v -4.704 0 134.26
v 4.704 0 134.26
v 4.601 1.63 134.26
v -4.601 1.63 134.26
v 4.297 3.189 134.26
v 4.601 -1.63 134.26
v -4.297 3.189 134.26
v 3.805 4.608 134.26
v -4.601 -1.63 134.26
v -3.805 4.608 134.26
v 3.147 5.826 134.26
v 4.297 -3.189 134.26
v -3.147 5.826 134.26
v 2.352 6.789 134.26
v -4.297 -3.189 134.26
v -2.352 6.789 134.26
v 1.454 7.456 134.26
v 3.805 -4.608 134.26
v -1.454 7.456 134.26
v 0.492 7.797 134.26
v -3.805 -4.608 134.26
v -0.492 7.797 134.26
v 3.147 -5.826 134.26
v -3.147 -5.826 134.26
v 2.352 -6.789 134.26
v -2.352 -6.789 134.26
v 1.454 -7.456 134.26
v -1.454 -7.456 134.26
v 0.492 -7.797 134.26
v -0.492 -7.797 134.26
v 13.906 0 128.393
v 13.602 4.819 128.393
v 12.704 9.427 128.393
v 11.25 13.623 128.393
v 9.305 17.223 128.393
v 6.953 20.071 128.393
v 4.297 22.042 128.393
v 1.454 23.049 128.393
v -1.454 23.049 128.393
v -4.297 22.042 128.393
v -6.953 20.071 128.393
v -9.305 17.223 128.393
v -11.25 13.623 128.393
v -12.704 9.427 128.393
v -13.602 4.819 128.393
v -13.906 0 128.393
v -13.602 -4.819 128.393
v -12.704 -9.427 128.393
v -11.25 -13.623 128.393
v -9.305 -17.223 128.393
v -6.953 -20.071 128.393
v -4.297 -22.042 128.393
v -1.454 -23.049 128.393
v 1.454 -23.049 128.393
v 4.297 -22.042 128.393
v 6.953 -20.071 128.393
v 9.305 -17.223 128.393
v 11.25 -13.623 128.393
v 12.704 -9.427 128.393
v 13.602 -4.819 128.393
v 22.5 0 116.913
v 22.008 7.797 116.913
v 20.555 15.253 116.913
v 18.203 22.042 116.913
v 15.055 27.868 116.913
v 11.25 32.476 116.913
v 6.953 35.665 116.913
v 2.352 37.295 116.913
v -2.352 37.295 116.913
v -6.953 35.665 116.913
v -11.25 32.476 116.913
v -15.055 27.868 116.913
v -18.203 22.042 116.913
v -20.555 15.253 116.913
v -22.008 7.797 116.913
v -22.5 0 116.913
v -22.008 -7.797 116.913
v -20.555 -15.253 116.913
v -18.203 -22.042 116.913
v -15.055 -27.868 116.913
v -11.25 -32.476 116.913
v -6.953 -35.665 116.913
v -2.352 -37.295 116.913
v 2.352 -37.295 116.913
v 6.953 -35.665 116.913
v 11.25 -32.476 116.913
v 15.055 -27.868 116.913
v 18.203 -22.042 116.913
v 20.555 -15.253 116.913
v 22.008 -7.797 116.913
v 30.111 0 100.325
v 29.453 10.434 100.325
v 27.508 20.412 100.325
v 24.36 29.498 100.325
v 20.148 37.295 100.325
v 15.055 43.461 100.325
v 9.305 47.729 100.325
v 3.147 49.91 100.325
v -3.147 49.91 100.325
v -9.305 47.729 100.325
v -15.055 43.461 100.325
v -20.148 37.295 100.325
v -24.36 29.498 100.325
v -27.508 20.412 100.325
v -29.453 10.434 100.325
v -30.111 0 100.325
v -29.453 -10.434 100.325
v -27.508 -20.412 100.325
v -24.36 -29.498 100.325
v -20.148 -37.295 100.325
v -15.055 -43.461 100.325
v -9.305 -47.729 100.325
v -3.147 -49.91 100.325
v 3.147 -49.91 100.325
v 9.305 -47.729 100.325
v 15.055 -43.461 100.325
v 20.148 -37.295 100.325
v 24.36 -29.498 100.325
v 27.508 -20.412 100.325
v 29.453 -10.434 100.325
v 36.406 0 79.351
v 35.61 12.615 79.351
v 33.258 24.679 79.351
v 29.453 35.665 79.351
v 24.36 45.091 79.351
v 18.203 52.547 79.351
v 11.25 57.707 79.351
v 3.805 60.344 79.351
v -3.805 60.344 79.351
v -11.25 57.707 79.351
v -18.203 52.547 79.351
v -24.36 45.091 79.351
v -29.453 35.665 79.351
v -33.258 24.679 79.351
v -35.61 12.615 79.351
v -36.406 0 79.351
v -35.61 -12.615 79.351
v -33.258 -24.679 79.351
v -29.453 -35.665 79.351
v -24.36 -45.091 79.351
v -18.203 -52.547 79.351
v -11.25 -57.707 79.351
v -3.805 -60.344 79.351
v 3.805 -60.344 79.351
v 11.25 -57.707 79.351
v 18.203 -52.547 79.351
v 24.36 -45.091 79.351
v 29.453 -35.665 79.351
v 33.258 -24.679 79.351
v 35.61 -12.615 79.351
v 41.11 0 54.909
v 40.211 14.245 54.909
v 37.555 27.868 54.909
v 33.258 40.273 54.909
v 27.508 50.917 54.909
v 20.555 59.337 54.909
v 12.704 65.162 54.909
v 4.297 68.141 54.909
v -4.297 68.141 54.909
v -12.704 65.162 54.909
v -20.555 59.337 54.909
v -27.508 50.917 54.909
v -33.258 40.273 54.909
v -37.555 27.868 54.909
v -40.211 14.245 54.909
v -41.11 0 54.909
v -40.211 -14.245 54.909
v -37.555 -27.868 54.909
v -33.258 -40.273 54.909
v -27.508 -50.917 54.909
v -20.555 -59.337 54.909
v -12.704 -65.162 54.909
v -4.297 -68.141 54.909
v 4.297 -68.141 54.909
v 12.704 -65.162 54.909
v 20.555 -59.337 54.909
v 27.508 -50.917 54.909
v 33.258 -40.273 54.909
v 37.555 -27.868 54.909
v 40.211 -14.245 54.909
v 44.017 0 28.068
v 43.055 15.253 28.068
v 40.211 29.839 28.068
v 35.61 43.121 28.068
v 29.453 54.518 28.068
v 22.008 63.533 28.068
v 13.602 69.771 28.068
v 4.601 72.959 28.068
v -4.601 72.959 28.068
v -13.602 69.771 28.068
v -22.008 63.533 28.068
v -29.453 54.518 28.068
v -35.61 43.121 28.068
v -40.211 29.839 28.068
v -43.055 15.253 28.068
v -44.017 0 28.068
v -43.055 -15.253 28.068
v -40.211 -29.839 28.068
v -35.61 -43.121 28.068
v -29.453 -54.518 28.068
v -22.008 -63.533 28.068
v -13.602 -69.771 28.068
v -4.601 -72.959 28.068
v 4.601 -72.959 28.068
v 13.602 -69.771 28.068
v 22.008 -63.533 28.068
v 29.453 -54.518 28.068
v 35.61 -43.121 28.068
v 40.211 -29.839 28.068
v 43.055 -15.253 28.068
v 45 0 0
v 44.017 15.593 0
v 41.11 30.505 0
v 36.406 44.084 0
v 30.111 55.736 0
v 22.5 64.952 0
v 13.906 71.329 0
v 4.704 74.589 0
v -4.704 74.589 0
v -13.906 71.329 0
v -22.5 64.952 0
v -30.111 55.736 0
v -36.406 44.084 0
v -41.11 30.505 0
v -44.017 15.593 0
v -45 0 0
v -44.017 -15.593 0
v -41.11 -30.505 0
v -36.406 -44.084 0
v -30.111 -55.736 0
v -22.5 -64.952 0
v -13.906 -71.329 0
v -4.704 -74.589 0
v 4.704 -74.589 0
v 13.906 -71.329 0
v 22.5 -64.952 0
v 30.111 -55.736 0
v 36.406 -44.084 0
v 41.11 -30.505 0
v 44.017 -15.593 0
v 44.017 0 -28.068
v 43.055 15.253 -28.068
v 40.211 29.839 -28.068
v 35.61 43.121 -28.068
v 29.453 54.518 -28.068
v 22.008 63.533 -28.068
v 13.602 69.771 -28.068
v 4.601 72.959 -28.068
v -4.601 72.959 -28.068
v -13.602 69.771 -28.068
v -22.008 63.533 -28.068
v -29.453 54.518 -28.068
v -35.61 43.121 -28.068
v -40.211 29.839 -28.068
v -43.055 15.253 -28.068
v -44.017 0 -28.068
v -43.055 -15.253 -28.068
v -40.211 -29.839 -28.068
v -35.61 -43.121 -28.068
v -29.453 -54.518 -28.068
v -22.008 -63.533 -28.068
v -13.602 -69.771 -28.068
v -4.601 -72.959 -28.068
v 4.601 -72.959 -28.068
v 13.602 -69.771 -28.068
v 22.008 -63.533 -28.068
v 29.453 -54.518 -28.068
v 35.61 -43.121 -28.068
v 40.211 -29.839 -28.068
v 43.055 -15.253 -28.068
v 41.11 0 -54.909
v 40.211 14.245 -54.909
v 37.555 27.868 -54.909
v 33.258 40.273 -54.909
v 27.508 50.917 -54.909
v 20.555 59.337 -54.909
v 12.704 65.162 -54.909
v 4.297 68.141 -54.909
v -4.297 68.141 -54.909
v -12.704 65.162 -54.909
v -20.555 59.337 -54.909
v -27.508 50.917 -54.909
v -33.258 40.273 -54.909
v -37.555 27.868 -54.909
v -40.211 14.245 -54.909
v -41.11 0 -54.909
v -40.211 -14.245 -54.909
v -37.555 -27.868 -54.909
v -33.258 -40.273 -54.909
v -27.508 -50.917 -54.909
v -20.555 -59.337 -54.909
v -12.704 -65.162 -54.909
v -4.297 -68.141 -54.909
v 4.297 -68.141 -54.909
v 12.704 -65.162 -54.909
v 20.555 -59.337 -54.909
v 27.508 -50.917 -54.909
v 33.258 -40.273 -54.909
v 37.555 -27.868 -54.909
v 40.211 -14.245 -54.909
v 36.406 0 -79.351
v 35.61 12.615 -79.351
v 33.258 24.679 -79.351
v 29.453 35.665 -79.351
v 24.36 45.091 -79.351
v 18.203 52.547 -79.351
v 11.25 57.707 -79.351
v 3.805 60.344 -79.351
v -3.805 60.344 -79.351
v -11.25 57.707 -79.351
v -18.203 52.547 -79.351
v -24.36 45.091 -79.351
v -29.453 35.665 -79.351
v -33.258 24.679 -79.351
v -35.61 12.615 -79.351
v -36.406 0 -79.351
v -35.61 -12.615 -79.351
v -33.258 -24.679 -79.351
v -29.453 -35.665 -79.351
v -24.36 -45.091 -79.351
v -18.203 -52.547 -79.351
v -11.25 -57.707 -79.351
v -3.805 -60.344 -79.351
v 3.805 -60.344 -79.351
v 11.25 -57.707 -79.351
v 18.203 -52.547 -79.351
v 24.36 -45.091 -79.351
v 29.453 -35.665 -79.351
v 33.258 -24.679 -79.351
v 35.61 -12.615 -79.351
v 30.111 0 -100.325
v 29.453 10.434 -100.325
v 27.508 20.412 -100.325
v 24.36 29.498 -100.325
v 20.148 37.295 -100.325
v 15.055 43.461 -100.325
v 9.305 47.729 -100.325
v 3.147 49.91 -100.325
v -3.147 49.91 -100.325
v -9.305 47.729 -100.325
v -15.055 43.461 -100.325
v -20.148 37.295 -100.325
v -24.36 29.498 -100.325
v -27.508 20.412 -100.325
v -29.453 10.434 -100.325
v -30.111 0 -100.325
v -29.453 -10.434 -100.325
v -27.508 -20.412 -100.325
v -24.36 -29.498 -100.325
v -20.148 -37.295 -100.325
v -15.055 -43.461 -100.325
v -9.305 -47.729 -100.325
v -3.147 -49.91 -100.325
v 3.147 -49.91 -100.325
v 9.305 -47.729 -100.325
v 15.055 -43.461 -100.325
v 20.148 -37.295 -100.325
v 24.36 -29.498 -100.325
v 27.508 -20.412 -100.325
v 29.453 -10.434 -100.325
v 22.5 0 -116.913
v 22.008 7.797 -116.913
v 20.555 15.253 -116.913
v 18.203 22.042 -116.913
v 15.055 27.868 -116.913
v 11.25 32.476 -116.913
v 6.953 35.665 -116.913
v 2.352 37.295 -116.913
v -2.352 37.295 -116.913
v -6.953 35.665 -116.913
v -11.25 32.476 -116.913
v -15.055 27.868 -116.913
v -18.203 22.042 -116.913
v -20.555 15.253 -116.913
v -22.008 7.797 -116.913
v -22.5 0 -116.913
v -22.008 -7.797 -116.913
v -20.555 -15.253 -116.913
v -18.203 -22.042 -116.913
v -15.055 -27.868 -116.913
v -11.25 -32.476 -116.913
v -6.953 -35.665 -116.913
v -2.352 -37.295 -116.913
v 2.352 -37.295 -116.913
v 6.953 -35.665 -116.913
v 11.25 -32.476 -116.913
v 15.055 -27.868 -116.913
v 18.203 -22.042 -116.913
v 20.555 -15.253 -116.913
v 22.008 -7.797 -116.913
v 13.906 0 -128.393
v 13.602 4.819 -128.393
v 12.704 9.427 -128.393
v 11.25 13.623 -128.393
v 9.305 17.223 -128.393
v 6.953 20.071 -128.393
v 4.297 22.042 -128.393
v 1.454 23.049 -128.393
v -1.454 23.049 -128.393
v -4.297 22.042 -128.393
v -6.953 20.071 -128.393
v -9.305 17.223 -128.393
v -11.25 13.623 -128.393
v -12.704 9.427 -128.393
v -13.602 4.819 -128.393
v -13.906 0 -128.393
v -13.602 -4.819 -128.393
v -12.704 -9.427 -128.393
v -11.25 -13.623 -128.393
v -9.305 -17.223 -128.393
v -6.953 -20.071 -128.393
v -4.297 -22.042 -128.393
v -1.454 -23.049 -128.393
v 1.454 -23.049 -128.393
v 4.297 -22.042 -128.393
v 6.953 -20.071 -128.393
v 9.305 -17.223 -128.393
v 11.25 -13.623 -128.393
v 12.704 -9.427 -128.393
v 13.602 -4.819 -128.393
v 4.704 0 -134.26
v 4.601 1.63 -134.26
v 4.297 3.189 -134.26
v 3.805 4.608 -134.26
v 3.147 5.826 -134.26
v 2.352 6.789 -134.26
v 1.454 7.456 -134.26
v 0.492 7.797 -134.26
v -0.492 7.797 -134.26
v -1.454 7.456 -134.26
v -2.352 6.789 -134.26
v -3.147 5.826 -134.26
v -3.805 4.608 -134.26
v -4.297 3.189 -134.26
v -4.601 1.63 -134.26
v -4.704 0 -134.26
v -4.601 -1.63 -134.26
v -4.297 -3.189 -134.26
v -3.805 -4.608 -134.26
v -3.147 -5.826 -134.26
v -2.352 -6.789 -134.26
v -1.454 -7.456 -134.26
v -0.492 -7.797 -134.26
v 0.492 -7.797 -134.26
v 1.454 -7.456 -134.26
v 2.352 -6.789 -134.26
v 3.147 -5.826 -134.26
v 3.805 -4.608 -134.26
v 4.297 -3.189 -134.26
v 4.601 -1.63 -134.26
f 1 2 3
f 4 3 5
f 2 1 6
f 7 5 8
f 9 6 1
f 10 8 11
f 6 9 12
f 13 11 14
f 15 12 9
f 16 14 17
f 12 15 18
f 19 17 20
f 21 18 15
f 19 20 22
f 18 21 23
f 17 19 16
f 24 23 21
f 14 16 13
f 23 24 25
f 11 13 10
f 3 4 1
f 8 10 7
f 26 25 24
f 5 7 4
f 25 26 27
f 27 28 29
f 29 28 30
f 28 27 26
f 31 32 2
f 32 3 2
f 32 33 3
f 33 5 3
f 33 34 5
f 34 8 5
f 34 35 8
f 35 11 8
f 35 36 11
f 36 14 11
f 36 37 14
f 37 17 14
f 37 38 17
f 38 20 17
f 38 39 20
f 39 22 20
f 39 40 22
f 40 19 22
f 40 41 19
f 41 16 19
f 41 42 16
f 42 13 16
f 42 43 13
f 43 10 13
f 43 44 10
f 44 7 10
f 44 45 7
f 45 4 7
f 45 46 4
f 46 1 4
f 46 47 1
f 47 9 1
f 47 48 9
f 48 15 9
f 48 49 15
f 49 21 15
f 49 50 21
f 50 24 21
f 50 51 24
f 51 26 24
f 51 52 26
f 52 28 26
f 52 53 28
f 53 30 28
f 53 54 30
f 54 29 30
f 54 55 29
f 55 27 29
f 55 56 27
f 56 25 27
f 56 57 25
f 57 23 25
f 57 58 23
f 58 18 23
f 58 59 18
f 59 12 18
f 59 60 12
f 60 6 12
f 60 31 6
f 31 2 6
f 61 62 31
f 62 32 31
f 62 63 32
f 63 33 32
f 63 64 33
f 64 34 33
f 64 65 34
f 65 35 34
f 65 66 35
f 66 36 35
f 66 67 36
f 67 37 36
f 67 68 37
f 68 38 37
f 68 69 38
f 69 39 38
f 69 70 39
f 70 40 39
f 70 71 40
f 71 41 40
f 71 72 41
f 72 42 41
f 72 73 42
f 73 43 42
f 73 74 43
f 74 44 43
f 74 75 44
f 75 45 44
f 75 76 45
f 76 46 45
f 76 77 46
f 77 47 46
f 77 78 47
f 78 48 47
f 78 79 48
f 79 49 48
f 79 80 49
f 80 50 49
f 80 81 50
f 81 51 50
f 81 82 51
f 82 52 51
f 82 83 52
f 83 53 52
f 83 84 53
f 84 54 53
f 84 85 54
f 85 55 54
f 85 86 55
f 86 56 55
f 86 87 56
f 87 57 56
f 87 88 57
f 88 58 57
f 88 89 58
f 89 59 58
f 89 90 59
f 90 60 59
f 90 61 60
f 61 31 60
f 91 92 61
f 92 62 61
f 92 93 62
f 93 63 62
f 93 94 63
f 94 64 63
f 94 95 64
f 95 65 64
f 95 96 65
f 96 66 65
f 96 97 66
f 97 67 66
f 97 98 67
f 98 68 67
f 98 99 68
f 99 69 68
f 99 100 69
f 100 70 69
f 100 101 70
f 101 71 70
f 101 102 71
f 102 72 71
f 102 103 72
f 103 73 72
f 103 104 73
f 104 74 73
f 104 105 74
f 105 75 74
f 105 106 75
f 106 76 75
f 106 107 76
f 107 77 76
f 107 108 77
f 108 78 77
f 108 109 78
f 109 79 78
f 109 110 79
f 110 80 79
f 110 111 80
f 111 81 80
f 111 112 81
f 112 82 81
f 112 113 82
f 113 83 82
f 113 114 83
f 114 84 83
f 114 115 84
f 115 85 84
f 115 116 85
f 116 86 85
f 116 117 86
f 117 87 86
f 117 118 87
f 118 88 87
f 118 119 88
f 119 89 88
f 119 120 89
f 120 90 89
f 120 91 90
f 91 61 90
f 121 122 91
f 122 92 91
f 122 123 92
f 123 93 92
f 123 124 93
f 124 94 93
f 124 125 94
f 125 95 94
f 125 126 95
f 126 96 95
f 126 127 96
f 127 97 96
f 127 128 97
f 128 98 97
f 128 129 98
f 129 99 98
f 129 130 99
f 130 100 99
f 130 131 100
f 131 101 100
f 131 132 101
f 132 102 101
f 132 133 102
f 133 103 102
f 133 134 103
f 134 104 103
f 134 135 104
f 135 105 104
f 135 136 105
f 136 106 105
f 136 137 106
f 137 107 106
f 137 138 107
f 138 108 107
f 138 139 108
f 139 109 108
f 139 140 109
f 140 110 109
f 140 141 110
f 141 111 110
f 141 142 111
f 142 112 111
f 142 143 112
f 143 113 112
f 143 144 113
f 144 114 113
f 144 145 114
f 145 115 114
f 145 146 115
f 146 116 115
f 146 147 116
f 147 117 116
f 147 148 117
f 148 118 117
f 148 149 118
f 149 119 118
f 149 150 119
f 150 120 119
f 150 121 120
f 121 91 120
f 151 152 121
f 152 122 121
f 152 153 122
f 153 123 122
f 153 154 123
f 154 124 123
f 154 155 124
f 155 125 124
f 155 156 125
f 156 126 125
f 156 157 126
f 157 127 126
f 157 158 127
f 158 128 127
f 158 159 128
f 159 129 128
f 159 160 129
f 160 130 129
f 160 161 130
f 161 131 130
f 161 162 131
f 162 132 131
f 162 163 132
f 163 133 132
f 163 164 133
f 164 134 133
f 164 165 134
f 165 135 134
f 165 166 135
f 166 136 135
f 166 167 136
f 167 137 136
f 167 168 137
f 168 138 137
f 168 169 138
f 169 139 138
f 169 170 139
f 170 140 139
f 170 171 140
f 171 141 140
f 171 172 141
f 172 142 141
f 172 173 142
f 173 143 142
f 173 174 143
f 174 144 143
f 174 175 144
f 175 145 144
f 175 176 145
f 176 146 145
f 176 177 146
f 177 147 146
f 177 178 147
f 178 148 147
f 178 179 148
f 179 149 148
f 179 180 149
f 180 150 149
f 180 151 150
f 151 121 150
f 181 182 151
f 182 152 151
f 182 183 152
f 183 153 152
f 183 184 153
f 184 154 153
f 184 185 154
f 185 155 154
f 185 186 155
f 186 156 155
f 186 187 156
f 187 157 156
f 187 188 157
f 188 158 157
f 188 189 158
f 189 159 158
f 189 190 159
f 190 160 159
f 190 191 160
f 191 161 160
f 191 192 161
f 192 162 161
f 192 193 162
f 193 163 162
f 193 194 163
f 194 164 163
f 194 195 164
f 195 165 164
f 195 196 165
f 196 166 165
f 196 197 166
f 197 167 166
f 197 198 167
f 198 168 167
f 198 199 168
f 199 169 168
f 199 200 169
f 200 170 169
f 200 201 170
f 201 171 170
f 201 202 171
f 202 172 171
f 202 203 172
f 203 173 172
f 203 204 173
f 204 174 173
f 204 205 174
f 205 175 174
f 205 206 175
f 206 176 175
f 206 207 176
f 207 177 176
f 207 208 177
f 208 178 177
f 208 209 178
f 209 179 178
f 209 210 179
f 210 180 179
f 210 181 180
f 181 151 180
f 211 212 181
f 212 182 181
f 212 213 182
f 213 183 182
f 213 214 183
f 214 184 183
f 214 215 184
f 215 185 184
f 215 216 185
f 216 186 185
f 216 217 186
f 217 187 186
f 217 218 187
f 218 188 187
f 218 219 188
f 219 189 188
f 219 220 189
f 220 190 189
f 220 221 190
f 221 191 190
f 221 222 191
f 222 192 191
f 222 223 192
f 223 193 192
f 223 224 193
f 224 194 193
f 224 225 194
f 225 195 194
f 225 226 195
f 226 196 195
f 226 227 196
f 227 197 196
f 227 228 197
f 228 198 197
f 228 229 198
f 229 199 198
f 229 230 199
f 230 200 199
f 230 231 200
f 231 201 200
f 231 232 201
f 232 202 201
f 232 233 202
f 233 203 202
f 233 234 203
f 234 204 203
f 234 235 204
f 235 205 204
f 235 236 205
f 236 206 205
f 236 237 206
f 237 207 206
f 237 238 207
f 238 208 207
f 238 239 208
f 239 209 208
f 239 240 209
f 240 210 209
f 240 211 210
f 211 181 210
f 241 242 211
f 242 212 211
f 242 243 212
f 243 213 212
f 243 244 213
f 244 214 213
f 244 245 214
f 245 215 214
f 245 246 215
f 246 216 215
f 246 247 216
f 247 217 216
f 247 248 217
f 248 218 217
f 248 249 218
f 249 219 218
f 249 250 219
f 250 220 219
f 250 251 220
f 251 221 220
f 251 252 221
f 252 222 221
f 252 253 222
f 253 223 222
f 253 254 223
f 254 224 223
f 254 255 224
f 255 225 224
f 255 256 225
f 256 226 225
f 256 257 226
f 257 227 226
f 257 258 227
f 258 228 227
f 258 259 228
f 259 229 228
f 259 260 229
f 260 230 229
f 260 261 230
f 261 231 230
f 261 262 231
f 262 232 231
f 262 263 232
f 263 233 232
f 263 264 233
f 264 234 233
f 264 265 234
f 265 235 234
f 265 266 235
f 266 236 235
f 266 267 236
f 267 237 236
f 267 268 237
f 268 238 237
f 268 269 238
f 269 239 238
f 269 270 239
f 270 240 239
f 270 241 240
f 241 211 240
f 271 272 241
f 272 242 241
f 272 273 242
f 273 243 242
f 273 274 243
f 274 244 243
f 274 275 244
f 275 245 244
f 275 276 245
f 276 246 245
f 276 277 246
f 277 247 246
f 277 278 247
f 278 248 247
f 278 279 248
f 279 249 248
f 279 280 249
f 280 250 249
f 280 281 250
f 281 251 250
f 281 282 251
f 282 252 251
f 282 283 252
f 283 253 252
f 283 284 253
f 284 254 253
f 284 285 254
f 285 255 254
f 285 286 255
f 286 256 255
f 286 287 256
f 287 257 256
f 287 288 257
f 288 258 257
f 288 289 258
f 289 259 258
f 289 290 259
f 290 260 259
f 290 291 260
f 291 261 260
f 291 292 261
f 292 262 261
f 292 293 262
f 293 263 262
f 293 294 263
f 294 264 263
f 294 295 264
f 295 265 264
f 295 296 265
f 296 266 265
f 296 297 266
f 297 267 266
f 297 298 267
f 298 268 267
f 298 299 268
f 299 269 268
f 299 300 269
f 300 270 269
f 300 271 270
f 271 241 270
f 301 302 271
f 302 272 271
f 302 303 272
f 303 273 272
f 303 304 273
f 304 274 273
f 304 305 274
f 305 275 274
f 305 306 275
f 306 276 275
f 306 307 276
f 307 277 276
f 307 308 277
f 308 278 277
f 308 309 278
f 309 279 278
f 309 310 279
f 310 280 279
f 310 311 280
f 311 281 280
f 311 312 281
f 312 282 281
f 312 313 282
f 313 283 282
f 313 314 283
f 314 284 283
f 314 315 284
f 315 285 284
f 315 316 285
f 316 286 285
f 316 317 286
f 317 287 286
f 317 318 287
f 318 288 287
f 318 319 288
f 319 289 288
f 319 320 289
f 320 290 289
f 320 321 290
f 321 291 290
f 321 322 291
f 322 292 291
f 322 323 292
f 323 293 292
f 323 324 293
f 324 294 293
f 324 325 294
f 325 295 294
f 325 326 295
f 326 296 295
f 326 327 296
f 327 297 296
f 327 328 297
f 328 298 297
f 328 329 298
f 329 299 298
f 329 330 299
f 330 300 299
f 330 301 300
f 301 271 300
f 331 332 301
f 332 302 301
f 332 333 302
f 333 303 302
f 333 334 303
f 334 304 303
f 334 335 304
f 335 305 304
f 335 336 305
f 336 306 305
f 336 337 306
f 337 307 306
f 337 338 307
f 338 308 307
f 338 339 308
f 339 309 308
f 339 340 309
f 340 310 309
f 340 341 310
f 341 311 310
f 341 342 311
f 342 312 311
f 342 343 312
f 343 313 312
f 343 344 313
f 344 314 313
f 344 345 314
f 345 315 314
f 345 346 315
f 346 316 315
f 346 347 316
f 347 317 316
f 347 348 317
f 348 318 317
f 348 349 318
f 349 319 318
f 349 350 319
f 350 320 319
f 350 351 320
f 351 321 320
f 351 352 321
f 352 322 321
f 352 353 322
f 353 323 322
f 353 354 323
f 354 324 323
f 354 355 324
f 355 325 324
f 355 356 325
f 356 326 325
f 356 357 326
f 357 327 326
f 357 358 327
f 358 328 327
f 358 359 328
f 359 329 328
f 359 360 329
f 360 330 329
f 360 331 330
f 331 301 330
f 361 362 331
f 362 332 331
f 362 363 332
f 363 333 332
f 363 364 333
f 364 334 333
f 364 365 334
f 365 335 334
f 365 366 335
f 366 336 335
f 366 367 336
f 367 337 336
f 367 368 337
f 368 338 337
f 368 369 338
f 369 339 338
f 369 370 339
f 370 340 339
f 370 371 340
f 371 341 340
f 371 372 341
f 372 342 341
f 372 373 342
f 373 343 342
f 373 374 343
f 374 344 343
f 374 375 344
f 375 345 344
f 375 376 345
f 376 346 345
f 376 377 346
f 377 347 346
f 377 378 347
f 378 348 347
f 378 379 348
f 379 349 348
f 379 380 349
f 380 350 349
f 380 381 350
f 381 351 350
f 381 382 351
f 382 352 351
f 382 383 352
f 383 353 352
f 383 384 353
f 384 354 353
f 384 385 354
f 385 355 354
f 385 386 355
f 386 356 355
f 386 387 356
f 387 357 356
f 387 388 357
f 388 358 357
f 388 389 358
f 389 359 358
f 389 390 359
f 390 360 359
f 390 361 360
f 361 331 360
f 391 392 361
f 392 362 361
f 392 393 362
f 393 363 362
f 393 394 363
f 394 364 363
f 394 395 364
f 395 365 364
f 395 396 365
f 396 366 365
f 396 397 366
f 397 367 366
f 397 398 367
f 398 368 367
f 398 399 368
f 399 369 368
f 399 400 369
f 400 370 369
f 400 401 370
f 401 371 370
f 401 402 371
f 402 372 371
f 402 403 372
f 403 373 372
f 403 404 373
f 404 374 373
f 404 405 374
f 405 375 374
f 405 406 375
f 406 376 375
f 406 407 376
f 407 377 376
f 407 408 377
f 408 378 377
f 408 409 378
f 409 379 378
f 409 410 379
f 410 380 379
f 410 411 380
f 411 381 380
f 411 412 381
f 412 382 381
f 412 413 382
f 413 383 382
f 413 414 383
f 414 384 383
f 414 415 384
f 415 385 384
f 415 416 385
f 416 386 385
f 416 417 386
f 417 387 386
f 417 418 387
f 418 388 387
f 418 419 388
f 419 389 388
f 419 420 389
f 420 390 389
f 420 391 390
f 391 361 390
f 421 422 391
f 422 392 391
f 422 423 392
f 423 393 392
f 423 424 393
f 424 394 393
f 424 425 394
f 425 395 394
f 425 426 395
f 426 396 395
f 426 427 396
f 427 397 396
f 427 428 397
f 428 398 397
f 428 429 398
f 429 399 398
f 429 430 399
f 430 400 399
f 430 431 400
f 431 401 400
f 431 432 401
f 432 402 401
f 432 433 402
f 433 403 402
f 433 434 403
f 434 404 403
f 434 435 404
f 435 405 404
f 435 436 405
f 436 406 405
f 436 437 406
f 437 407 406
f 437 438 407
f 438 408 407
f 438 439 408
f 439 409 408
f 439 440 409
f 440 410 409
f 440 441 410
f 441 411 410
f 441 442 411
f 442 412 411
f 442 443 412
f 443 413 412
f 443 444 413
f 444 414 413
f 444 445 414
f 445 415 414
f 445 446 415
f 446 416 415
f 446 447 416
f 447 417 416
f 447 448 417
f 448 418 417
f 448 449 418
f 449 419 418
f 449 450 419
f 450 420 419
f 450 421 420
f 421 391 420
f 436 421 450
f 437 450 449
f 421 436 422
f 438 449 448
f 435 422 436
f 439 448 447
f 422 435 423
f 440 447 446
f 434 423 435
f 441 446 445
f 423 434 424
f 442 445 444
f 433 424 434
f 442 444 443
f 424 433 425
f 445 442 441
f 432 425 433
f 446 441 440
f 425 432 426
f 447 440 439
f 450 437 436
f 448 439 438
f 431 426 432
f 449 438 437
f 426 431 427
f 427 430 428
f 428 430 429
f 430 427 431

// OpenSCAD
// Generated by SolidPython 1.0.1 on 2020-07-29 00:39:25


scale(v = [3, 5, 9]) {
	sphere(r = 15);
}
/***********************************************
*********      SolidPython code:      **********
************************************************
 
# import packages: SolidPython
from solid import *
from solid.utils import *
from itertools import chain, combinations


class Resize:

    def __init__(self, scad_file):
        self.scad_file = scad_file
        #self.scad_file = import_scad(scad_file)
        # cone/cylinder param:
        self.r1 = 0
        self.r2 = 0
        self.h = 0
        # rectangular prism param:
        self.w = 0
        self.l = 0
        # ellipse param:
        self.r = 0

    # import OpenScad code (file name corresponds to shape)


    # classify shape + parameters
    def assign(self, param1, param2, param3):
        if self.scad_file == 'cone.scad':
            self.r1 = param1
            self.r2 = param2
            self.h = param3
        elif self.scad_file == 'cylinder.scad':
            self.r1 = param1
            self.r2 = param2
            self.h = param3
        elif self.scad_file == 'rectangularPrism.scad':
            self.h = param1
            self.l = param2
            self.w = param3
        else:
            self.r = param1
            self.h = param2

    # resize parameters
    def iterate(self):
        x = range(3, 20, 2)
        i = 1
        if self.scad_file == 'cone.scad':
            tempList = list(combinations(x, 2))
            for temp in tempList:
                param1 = temp[0]
                param2 = temp[1]
                filepath = 'produced_scad_files/' + 'cone' + str(param1) + '_' + str(param2) + '_' + '.scad'
                scad_render_to_file(cylinder(h=param1, r1=param2, r2=0), filepath)

        elif self.scad_file == 'cylinder.scad':
            tempList = list(combinations(x, 3))
            for temp in tempList:
                param1 = temp[0]
                param2 = temp[1]
                filepath = 'produced_scad_files/' + 'cylinder' + str(param1) + '_' + str(param2) + '_' + '.scad'
                scad_render_to_file(cylinder(h=param1, r1=param2, r2=param2), filepath)

        elif self.scad_file == 'rectangularPrism.scad':
            tempList = list(combinations(x, 3))
            for temp in tempList:
                param1 = temp[0]
                param2 = temp[1]
                param3 = temp[2]
                filepath = 'produced_scad_files/' + 'rectangularPrism' + str(param1) + '_' + str(param2) + '_' + str(
                    param3) + '.scad'
                scad_render_to_file(cube(size=(param1, param2, param3)), filepath)

        elif self.scad_file == 'ellipse.scad':
            tempList = list(combinations(x, 4))
            for temp in tempList:
                param1 = temp[0]
                param2 = temp[1]
                param3 = temp[2]
                param4 = temp[3]
                filepath = 'produced_scad_files/' + 'ellipse' + str(param1) + '_' + str(param2) + '_' + str(param3) + '_' + str(param4) + '.scad'
                scad_render_to_file(scale([param1, param2, param3])(sphere(r=param4)), filepath)

    def render_to_scadfile(self):
        scad_render_to_file(scad, 'example.scad') 
 
************************************************/
